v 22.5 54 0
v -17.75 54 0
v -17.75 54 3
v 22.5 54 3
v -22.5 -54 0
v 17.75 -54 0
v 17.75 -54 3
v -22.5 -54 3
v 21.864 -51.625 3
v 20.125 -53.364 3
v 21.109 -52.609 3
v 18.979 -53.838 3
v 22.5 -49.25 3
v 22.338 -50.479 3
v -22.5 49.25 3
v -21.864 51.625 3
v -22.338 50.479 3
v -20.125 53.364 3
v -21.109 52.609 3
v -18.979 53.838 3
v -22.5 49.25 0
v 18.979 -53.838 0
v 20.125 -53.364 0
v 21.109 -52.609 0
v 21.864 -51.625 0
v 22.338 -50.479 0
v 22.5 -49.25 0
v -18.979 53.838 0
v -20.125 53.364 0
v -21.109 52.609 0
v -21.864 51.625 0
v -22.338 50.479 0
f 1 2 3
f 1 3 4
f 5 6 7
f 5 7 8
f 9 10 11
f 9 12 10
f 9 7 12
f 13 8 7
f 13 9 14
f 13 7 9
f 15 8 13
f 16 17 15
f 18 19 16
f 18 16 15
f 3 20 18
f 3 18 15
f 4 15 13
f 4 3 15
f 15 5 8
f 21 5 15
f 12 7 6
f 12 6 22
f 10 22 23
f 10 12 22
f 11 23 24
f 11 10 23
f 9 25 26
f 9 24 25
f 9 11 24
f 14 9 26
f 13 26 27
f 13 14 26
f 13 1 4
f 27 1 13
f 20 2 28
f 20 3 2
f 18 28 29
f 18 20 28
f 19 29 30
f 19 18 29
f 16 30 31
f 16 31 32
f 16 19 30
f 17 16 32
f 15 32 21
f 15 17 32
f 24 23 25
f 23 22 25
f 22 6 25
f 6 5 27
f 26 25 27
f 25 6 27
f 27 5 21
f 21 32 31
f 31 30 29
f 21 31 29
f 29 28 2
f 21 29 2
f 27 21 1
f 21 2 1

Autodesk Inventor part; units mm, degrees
ref_plane "YZ Plane" through (0, 0, 0) normal (1, 0, 0) x (0, 1, 0)
ref_plane "XZ Plane" through (0, 0, 0) normal (0, 1, 0) x (-1, 0, 0)
ref_plane "XY Plane" through (0, 0, 0) normal (0, 0, 1) x (1, 0, 0)
sketch "Sketch1" plane through (0, 0, 0) normal (0, 0, 1) x (1, 0, 0)
  line L0 (-22.5, 54) -> (22.5, 54)
  line L1 (22.5, 54) -> (22.5, -54)
  line L2 (22.5, -54) -> (-22.5, -54)
  line L3 (-22.5, -54) -> (-22.5, 54)
  line L4 (-22.5, 54) -> (22.5, -54) construction
  point P0 (0, 0)
  point P1 (0, 0)
  dimension "d0" = 45
  dimension "d1" = 108
extrude "Plate1" add sketch "Sketch1" along normal blind 3
fillet "Corner Round2" radius 4.75 2 edges at (22.5, -54, 1.5) (-22.5, 54, 1.5)
equation "\"d0\" = RIDGE_1_width"
equation "\"d2\" = Thickness"
equation "\"BendReliefWidth\" = Thickness"
equation "\"BendReliefDepth\" = 0.5 * Thickness"
equation "\"CornerReliefSize\" = 4 * Thickness"
equation "\"MinimumRemnant\" = 2 * Thickness"
equation "\"TransitionRadius\" = BendRadius"
equation "\"JacobiRadiusSize\" = BendRadius"
equation "\"GapSize\" = Thickness"
equation "\"RIDGE_1_width\" = 45"
equation "\"Thickness\" = 3"
equation "\"BendRadius\" = 5"
properties part number "DSB-104 ridge end cap" material "Stainless Steel"
